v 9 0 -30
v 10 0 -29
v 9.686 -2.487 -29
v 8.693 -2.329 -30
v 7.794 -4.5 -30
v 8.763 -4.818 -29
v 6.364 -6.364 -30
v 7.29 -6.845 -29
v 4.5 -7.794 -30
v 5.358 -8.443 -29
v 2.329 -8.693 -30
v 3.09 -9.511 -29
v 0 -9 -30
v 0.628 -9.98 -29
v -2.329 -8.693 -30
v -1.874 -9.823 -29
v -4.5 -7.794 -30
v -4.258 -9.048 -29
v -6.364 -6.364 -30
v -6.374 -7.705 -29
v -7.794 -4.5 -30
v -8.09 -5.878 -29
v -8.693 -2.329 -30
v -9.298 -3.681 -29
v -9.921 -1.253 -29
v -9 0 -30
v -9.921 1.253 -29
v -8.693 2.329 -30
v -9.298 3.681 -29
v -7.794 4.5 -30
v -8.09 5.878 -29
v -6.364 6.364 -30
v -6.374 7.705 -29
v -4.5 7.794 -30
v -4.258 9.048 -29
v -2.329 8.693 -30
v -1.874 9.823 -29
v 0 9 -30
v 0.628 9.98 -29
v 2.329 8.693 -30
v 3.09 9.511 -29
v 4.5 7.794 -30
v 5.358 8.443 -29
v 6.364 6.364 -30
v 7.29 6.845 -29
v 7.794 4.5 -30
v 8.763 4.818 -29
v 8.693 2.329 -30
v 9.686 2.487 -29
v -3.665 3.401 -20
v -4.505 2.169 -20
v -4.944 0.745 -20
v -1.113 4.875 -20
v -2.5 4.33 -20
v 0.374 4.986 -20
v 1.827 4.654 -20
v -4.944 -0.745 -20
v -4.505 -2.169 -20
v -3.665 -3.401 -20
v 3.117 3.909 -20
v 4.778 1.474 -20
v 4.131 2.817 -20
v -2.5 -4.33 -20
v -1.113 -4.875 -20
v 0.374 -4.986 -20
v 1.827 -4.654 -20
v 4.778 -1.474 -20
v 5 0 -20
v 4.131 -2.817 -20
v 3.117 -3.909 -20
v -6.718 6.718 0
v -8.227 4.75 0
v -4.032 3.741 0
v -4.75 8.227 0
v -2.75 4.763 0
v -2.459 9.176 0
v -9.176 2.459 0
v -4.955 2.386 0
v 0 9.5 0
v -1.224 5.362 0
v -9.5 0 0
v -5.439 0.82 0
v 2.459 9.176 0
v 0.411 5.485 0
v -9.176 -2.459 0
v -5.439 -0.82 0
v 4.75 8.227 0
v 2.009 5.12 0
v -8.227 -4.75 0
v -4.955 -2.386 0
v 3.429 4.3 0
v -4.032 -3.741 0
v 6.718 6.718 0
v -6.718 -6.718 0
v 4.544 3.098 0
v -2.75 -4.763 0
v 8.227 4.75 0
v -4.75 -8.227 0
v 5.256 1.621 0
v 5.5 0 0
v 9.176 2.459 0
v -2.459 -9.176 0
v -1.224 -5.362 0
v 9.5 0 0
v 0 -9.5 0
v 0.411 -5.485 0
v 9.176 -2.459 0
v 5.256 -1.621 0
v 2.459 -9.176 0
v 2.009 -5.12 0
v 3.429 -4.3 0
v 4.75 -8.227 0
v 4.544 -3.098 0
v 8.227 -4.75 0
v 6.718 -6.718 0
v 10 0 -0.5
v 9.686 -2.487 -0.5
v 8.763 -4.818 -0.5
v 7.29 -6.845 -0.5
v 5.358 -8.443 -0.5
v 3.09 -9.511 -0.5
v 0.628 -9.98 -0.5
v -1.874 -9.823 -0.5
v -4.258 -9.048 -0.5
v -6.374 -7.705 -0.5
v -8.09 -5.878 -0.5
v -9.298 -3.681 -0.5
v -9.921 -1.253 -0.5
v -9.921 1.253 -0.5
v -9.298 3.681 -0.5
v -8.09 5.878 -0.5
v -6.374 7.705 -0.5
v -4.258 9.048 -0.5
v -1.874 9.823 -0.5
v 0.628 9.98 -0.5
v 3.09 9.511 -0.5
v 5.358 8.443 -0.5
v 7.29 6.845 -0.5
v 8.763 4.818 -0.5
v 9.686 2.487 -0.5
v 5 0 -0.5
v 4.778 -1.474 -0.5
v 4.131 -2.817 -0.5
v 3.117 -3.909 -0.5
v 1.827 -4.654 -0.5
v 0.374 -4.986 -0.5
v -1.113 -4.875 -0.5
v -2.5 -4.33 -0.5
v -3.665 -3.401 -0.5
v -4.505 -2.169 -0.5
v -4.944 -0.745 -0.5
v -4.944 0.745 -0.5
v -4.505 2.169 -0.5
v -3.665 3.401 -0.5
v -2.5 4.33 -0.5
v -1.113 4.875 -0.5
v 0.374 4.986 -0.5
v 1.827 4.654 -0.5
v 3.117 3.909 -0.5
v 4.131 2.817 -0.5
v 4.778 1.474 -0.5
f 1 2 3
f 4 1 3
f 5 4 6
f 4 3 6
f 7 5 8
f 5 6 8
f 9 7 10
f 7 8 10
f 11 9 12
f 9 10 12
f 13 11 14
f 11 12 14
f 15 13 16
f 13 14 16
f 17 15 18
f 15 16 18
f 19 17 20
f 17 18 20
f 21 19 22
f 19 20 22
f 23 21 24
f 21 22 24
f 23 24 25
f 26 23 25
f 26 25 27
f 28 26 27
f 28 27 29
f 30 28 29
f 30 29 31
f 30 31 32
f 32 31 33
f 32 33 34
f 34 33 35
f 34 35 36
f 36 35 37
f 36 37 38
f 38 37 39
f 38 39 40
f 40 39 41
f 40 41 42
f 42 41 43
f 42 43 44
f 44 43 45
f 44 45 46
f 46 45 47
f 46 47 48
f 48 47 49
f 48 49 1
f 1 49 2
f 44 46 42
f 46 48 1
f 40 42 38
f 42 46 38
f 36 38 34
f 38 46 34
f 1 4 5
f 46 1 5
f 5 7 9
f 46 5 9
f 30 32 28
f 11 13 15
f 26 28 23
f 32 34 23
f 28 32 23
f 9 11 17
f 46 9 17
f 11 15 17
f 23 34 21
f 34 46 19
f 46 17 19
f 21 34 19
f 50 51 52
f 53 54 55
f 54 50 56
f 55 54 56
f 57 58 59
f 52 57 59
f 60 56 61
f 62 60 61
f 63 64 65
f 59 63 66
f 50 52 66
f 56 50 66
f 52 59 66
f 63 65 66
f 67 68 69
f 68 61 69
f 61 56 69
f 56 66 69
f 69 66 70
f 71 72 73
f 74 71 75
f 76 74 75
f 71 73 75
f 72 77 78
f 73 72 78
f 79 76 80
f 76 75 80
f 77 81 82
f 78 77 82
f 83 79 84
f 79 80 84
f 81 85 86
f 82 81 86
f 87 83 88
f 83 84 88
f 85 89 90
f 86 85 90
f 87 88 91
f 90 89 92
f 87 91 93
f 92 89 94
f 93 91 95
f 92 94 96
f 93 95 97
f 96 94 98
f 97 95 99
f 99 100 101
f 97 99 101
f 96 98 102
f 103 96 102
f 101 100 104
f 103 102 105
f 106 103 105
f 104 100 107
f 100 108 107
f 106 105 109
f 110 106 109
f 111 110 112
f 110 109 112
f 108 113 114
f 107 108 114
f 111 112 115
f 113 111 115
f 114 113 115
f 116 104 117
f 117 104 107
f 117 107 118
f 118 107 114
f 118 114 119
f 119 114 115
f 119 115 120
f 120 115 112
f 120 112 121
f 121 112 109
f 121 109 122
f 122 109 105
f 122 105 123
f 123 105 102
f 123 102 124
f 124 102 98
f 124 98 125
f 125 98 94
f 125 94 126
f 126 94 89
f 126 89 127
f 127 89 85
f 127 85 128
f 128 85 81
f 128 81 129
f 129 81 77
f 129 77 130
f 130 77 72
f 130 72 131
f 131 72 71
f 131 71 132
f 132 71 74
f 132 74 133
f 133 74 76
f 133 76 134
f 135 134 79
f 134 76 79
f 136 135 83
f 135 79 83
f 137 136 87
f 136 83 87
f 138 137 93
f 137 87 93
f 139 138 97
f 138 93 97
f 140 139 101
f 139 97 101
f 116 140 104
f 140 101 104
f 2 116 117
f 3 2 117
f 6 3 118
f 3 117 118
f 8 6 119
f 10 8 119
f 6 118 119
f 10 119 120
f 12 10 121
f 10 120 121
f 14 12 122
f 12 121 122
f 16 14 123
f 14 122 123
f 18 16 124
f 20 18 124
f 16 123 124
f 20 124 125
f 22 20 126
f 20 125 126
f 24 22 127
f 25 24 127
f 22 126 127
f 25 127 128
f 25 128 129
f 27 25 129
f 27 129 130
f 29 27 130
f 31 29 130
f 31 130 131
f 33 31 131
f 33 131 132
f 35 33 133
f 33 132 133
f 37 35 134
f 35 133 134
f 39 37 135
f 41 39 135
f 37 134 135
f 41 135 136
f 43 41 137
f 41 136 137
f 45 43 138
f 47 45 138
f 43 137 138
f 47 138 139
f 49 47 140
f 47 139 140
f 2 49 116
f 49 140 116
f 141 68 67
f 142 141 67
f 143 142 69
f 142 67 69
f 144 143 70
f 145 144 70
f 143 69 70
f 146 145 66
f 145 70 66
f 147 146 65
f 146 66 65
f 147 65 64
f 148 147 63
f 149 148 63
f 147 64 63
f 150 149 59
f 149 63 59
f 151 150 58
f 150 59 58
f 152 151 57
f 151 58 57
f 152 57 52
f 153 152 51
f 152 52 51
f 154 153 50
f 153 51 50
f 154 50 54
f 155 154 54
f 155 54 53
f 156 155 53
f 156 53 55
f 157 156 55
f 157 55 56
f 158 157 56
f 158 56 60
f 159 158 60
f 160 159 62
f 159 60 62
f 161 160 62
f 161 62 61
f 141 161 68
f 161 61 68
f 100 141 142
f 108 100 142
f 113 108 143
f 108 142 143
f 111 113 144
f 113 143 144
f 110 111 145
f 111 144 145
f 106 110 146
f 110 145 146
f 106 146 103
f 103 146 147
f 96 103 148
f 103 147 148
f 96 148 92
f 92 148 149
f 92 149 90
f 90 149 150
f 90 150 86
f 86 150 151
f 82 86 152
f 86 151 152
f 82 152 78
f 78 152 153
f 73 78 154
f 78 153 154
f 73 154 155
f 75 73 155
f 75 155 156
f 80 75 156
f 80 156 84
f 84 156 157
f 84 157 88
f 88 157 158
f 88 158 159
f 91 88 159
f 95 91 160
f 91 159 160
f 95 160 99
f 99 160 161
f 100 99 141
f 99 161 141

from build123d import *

# Parameters (mm, degrees)
F2_SIZE = 1
F3_SIZE = 0.5


with BuildPart() as f1:
    # F0 (on Front) → F1 (revolve)
    with BuildSketch(Plane.XZ):
        Polygon((0, -20), (0, -30), (10, -30), (10, 0), (5, 0), (5, -20), align=None)
    revolve(axis=Axis((0, 0, -25), (0, 0, -1)))

    # F2
    f2_edges = [f1.edges().sort_by_distance(p)[0] for p in [
        (-10, 0, -30),
    ]]
    chamfer(f2_edges, length=F2_SIZE)

    # F3
    f3_edges = [f1.edges().sort_by_distance(p)[0] for p in [
        (-10, 0, 0),
        (-5, 0, 0),
    ]]
    chamfer(f3_edges, length=F3_SIZE)


solid = f1.part
